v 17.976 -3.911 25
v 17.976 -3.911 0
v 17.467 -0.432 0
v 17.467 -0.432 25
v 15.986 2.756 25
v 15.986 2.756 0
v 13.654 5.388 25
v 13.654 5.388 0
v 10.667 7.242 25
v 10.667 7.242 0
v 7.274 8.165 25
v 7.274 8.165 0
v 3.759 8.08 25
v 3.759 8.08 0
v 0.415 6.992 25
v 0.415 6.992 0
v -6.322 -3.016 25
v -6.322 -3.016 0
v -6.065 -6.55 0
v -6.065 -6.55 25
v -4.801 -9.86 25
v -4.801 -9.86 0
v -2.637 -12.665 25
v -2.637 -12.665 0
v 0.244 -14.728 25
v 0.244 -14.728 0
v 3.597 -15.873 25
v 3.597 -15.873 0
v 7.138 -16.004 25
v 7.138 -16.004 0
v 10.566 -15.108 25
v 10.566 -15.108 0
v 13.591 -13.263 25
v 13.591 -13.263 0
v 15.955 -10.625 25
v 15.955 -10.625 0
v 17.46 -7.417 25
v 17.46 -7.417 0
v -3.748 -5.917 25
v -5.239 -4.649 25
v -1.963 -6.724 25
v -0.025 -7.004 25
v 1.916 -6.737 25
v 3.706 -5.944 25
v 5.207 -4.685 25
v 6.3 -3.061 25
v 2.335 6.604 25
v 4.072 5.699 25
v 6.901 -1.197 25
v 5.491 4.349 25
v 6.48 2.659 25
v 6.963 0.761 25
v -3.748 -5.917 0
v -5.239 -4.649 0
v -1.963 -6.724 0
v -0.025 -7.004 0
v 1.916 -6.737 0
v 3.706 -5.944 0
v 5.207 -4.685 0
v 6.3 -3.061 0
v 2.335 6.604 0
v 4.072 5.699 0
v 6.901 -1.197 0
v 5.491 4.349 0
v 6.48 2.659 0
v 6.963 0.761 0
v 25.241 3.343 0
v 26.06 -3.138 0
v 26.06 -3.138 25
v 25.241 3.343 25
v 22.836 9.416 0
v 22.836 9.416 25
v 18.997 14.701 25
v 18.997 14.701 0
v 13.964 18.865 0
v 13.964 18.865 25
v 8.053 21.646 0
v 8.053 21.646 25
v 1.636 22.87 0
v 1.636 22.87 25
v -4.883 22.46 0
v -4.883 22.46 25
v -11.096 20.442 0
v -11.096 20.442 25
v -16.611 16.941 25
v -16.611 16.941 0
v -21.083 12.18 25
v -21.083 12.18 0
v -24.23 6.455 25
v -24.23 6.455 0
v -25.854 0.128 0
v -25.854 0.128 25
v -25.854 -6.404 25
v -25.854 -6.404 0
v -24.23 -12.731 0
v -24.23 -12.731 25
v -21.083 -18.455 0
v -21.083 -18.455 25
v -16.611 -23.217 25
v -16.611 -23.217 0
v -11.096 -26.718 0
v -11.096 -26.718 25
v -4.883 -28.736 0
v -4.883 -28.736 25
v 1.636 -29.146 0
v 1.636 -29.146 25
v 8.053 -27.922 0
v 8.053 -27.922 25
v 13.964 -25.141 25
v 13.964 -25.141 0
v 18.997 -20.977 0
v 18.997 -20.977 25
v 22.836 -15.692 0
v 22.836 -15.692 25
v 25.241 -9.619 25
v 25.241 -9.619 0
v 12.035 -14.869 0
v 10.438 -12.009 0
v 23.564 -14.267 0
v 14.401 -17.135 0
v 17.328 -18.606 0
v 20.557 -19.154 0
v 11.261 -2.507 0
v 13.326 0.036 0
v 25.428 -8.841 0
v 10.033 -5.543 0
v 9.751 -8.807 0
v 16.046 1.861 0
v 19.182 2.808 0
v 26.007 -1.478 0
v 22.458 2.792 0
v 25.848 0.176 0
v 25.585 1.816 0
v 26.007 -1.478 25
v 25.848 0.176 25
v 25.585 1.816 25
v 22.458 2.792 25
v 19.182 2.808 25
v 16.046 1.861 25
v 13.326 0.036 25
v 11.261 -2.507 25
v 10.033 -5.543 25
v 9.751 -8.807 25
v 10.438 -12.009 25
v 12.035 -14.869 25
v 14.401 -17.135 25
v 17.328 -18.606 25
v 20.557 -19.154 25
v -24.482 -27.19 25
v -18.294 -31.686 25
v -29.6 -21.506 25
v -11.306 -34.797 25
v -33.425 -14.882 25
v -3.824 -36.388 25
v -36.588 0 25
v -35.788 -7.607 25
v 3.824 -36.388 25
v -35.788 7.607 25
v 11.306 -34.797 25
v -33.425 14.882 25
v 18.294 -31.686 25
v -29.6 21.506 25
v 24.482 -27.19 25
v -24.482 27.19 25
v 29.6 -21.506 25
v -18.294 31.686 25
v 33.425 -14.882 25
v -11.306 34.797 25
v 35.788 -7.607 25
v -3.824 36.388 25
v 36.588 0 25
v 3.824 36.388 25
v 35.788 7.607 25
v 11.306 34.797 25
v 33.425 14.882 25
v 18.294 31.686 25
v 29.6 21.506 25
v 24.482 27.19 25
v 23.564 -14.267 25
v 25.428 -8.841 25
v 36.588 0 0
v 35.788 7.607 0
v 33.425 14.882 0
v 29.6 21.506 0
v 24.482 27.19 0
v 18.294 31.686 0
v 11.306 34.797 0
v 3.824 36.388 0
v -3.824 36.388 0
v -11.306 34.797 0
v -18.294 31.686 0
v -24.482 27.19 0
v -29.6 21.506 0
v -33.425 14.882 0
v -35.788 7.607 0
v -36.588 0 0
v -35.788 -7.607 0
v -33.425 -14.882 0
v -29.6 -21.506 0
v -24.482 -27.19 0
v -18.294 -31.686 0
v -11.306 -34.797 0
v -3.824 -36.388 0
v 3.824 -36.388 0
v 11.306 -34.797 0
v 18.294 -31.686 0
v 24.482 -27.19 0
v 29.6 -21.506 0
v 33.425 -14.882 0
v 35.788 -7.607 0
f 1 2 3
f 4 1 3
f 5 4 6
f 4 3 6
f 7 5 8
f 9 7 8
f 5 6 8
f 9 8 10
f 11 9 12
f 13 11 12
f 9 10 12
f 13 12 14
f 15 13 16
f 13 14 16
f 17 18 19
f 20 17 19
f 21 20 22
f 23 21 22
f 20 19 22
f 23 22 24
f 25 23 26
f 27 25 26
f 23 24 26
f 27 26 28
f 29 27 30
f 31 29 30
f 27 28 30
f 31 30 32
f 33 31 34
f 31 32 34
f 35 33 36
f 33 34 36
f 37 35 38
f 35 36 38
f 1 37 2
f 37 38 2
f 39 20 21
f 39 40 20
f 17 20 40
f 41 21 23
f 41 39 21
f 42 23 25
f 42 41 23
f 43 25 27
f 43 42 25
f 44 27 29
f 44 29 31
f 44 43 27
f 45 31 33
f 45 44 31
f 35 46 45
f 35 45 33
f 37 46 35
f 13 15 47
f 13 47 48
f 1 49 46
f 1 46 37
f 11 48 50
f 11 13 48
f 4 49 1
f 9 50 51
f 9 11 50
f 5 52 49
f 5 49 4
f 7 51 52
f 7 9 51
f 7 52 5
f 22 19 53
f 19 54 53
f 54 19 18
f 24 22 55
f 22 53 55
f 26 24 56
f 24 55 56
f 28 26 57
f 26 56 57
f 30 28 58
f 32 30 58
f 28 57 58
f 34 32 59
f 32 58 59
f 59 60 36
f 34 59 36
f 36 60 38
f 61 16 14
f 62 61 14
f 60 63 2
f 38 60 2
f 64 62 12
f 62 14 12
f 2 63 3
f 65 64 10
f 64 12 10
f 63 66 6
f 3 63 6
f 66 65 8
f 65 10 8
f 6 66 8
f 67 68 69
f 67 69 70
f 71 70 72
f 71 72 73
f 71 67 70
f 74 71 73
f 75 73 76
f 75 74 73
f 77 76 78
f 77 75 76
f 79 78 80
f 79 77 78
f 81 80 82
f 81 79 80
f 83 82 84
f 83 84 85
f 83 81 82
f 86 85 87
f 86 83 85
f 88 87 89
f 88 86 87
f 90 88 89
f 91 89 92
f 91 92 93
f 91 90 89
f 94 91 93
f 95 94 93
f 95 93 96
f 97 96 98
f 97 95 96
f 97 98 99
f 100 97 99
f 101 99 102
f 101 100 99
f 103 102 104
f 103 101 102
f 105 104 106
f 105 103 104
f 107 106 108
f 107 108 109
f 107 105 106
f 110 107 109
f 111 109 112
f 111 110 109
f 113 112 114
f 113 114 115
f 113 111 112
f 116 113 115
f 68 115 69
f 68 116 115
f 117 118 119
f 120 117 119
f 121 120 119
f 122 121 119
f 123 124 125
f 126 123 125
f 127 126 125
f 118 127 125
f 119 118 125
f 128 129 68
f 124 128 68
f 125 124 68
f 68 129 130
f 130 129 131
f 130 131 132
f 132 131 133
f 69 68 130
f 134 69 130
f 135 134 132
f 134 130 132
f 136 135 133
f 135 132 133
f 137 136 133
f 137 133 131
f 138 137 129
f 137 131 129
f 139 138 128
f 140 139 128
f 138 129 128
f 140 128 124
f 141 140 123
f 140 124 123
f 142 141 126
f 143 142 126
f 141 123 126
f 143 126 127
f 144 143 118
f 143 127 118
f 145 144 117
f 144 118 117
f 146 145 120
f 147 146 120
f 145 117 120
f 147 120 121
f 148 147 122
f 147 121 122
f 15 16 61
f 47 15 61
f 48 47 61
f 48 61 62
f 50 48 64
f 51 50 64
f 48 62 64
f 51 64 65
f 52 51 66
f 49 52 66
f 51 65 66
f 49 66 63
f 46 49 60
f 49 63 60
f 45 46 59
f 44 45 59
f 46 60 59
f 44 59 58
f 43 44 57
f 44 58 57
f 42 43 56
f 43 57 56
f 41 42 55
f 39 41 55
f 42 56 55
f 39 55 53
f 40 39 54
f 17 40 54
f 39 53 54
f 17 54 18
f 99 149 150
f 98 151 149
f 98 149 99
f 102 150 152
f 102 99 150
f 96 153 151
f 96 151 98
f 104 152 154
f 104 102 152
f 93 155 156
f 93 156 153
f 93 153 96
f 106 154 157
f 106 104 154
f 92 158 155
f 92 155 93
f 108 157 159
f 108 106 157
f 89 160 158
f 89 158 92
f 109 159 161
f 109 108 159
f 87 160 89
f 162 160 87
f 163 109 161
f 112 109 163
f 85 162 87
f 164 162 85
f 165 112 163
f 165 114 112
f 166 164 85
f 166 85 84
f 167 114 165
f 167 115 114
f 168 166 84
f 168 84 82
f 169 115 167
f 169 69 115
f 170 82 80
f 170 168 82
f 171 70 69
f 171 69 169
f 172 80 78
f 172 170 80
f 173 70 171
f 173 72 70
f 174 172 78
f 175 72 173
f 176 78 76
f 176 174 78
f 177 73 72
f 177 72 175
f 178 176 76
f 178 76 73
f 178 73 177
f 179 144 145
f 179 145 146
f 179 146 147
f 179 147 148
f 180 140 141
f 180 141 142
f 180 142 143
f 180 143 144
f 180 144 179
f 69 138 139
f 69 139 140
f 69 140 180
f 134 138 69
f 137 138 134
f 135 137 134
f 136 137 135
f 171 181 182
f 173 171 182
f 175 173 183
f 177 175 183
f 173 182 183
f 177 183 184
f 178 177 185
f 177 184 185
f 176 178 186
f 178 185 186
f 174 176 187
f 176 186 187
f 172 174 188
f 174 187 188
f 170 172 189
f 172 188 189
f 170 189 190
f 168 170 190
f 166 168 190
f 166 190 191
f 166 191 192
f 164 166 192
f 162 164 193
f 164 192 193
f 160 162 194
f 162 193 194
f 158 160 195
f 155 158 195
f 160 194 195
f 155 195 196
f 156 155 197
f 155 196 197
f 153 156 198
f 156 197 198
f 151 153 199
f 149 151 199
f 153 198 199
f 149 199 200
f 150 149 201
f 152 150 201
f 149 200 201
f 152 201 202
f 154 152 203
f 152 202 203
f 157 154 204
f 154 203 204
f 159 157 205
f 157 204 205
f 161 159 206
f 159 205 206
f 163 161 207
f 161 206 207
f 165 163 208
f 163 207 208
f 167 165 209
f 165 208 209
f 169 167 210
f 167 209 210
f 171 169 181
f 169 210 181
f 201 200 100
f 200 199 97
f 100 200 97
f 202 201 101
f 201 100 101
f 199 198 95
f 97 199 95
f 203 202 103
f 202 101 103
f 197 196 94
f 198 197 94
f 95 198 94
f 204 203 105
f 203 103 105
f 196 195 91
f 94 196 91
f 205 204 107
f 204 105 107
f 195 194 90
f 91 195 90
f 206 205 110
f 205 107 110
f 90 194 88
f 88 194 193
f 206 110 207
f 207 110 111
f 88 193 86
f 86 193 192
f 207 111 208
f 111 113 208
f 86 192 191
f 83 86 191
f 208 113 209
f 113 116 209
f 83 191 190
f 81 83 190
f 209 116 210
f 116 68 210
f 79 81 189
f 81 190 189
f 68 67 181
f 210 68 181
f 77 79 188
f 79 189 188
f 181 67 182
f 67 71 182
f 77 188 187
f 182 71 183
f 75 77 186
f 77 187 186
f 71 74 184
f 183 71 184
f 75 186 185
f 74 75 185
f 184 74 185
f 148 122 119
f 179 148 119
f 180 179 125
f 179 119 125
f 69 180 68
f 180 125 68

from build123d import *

# Parameters (mm, degrees)
F0_R     = 36.5880329935
F0_R_2   = 26.0597535875
F2_DEPTH = 25


with BuildPart() as f2:
    # F0 (on Top) → F2 (new body)
    with BuildSketch(Plane.XY):
        Circle(F0_R)
        with Locations((0, -3.1379330903)):
            Circle(F0_R_2, mode=Mode.SUBTRACT)
    extrude(amount=F2_DEPTH)


with BuildPart() as f2b:
    # F0 (on Top) → F2, piece 2 (new body)
    with BuildSketch(Plane.XY):
        with BuildLine():
            ThreePointArc((0.4154471066, 6.9919972632), (5.097575412, 4.8036805624), (7.0043288063, 0))
            ThreePointArc((7.0043288063, 0), (1.546341602, -6.8315042031), (-6.3215589318, -3.0163744294))
            ThreePointArc((-6.3215589318, -3.0163744294), (5.3627811466, -16.0681131443), (17.9756076154, -3.9112922186))
            ThreePointArc((17.9756076154, -3.9112922186), (12.2275946786, 6.4236117314), (0.4154471066, 6.9919972632))
        make_face()
    extrude(amount=F2_DEPTH)


with BuildPart() as f2c:
    # F1 (on face) → F2, piece 3 (new body)
    with BuildSketch(Plane.XY):
        with BuildLine():
            ThreePointArc((26.0597535875, -3.1379330903), (25.9406809612, -0.6495946263), (25.5845512192, 1.816004329))
            ThreePointArc((25.5845512192, 1.816004329), (10.0333502545, -5.5433353176), (20.5572056531, -19.1539267459))
            ThreePointArc((20.5572056531, -19.1539267459), (24.6457549165, -11.6053719969), (26.0597535875, -3.1379330903))
        make_face()
    extrude(amount=F2_DEPTH)


solid = Compound([f2.part, f2b.part, f2c.part])
